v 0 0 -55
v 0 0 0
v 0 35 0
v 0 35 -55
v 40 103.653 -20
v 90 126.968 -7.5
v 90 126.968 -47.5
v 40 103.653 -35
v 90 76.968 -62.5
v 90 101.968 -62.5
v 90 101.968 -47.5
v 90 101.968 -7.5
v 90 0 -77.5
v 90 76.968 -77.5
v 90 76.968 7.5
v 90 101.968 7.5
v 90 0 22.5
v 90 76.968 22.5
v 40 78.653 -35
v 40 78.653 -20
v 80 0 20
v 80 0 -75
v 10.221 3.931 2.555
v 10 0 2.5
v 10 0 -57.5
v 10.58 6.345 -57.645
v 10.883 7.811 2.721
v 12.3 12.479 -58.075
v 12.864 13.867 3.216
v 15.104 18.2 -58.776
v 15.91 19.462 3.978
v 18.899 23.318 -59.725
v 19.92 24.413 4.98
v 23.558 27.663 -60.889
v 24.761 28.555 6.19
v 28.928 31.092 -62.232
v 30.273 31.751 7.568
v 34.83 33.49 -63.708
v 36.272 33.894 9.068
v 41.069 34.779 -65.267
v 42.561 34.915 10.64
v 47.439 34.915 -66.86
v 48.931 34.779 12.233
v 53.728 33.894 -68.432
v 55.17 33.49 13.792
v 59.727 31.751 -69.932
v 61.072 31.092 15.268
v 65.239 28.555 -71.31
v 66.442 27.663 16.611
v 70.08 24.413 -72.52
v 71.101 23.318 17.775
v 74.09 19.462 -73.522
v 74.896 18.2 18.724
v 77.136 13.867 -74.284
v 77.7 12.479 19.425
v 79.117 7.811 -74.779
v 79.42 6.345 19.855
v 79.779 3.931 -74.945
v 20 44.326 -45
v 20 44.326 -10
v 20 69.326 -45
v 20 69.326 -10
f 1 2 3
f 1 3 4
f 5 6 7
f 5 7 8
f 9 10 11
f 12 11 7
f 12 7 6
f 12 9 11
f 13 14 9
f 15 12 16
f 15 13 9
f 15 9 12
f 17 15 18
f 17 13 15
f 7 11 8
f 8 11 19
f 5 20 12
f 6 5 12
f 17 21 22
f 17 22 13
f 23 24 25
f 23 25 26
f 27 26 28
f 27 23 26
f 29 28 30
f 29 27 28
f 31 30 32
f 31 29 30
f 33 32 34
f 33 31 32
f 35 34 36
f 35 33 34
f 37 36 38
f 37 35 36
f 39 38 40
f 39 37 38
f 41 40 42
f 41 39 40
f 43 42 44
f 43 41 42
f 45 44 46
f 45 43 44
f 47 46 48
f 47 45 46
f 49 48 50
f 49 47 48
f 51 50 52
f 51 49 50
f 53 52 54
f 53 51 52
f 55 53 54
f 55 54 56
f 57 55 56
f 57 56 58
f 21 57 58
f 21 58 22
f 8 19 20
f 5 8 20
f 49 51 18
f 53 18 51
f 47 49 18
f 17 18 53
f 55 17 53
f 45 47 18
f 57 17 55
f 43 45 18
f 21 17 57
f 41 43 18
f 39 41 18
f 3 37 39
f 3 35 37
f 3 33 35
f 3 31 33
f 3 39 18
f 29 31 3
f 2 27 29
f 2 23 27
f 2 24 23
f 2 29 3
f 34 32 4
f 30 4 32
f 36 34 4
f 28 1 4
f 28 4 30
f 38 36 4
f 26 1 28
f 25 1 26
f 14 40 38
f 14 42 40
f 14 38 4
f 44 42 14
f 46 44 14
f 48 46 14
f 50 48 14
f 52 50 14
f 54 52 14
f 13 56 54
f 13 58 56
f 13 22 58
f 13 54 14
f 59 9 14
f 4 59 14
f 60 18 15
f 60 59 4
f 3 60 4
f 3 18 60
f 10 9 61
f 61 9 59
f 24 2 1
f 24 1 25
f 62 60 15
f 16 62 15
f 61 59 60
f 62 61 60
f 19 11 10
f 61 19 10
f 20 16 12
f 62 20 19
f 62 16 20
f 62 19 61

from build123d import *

# Parameters (mm, degrees)
EXTRUDE1_DEPTH = 76.968
EXTRUDE2_DEPTH = 90
EXTRUDE3_DEPTH = 101.968
EXTRUDE4_DEPTH = 76.321
EXTRUDE5_DEPTH = 126.968
EXTRUDE6_DEPTH = 126.968
EXTRUDE7_DEPTH = 88.484


with BuildPart() as part:
    # Sketch1 → Extrude1 (new body)
    with BuildSketch(Plane(origin=(0, 0, 0), x_dir=(1, 0, 0), z_dir=(0, 1, 0))):
        Polygon((0, 0), (0, 55), (90, 77.5), (90, -22.5), align=None)
    extrude(amount=EXTRUDE1_DEPTH)

    # Sketch2 → Extrude2 (cut, symmetric)
    with BuildSketch(Plane.XY):
        Polygon((90, 76.968), (0, 35.000310766), (0, 76.968), align=None)
    extrude(amount=EXTRUDE2_DEPTH, both=True, mode=Mode.SUBTRACT)

    # Sketch3 → Extrude3 (add)
    with BuildSketch(Plane(origin=(0, 0, 0), x_dir=(1, 0, 0), z_dir=(0, 1, 0))):
        Polygon((90, 62.5), (20, 45), (20, 10), (90, -7.5), align=None)
    extrude(amount=EXTRUDE3_DEPTH)

    # Sketch4 → Extrude4 (cut, symmetric)
    with BuildSketch(Plane.XY):
        Polygon((90, 101.968), (20, 69.326463929), (20, 101.968), align=None)
    extrude(amount=EXTRUDE4_DEPTH, both=True, mode=Mode.SUBTRACT)

    # Sketch5 → Extrude5 (add)
    with BuildSketch(Plane(origin=(0, 0, 0), x_dir=(1, 0, 0), z_dir=(0, 1, 0))):
        Polygon((90, 47.5), (40, 35), (40, 20), (90, 7.5), align=None)
    extrude(amount=EXTRUDE5_DEPTH)

    # Sketch6 → Extrude6 (cut)
    with BuildSketch(Plane.XY):
        Polygon((90, 126.968), (40, 103.652617092), (40, 126.968), align=None)
    extrude(amount=-EXTRUDE6_DEPTH, mode=Mode.SUBTRACT)

    # Sketch7 → Extrude7 (cut, symmetric)
    with BuildSketch(Plane.XY):
        with BuildLine():
            Line((80, 0), (10, 0))
            ThreePointArc((10, 0), (45, 35), (80, 0))
        make_face()
    extrude(amount=EXTRUDE7_DEPTH, both=True, mode=Mode.SUBTRACT)


solid = part.part
